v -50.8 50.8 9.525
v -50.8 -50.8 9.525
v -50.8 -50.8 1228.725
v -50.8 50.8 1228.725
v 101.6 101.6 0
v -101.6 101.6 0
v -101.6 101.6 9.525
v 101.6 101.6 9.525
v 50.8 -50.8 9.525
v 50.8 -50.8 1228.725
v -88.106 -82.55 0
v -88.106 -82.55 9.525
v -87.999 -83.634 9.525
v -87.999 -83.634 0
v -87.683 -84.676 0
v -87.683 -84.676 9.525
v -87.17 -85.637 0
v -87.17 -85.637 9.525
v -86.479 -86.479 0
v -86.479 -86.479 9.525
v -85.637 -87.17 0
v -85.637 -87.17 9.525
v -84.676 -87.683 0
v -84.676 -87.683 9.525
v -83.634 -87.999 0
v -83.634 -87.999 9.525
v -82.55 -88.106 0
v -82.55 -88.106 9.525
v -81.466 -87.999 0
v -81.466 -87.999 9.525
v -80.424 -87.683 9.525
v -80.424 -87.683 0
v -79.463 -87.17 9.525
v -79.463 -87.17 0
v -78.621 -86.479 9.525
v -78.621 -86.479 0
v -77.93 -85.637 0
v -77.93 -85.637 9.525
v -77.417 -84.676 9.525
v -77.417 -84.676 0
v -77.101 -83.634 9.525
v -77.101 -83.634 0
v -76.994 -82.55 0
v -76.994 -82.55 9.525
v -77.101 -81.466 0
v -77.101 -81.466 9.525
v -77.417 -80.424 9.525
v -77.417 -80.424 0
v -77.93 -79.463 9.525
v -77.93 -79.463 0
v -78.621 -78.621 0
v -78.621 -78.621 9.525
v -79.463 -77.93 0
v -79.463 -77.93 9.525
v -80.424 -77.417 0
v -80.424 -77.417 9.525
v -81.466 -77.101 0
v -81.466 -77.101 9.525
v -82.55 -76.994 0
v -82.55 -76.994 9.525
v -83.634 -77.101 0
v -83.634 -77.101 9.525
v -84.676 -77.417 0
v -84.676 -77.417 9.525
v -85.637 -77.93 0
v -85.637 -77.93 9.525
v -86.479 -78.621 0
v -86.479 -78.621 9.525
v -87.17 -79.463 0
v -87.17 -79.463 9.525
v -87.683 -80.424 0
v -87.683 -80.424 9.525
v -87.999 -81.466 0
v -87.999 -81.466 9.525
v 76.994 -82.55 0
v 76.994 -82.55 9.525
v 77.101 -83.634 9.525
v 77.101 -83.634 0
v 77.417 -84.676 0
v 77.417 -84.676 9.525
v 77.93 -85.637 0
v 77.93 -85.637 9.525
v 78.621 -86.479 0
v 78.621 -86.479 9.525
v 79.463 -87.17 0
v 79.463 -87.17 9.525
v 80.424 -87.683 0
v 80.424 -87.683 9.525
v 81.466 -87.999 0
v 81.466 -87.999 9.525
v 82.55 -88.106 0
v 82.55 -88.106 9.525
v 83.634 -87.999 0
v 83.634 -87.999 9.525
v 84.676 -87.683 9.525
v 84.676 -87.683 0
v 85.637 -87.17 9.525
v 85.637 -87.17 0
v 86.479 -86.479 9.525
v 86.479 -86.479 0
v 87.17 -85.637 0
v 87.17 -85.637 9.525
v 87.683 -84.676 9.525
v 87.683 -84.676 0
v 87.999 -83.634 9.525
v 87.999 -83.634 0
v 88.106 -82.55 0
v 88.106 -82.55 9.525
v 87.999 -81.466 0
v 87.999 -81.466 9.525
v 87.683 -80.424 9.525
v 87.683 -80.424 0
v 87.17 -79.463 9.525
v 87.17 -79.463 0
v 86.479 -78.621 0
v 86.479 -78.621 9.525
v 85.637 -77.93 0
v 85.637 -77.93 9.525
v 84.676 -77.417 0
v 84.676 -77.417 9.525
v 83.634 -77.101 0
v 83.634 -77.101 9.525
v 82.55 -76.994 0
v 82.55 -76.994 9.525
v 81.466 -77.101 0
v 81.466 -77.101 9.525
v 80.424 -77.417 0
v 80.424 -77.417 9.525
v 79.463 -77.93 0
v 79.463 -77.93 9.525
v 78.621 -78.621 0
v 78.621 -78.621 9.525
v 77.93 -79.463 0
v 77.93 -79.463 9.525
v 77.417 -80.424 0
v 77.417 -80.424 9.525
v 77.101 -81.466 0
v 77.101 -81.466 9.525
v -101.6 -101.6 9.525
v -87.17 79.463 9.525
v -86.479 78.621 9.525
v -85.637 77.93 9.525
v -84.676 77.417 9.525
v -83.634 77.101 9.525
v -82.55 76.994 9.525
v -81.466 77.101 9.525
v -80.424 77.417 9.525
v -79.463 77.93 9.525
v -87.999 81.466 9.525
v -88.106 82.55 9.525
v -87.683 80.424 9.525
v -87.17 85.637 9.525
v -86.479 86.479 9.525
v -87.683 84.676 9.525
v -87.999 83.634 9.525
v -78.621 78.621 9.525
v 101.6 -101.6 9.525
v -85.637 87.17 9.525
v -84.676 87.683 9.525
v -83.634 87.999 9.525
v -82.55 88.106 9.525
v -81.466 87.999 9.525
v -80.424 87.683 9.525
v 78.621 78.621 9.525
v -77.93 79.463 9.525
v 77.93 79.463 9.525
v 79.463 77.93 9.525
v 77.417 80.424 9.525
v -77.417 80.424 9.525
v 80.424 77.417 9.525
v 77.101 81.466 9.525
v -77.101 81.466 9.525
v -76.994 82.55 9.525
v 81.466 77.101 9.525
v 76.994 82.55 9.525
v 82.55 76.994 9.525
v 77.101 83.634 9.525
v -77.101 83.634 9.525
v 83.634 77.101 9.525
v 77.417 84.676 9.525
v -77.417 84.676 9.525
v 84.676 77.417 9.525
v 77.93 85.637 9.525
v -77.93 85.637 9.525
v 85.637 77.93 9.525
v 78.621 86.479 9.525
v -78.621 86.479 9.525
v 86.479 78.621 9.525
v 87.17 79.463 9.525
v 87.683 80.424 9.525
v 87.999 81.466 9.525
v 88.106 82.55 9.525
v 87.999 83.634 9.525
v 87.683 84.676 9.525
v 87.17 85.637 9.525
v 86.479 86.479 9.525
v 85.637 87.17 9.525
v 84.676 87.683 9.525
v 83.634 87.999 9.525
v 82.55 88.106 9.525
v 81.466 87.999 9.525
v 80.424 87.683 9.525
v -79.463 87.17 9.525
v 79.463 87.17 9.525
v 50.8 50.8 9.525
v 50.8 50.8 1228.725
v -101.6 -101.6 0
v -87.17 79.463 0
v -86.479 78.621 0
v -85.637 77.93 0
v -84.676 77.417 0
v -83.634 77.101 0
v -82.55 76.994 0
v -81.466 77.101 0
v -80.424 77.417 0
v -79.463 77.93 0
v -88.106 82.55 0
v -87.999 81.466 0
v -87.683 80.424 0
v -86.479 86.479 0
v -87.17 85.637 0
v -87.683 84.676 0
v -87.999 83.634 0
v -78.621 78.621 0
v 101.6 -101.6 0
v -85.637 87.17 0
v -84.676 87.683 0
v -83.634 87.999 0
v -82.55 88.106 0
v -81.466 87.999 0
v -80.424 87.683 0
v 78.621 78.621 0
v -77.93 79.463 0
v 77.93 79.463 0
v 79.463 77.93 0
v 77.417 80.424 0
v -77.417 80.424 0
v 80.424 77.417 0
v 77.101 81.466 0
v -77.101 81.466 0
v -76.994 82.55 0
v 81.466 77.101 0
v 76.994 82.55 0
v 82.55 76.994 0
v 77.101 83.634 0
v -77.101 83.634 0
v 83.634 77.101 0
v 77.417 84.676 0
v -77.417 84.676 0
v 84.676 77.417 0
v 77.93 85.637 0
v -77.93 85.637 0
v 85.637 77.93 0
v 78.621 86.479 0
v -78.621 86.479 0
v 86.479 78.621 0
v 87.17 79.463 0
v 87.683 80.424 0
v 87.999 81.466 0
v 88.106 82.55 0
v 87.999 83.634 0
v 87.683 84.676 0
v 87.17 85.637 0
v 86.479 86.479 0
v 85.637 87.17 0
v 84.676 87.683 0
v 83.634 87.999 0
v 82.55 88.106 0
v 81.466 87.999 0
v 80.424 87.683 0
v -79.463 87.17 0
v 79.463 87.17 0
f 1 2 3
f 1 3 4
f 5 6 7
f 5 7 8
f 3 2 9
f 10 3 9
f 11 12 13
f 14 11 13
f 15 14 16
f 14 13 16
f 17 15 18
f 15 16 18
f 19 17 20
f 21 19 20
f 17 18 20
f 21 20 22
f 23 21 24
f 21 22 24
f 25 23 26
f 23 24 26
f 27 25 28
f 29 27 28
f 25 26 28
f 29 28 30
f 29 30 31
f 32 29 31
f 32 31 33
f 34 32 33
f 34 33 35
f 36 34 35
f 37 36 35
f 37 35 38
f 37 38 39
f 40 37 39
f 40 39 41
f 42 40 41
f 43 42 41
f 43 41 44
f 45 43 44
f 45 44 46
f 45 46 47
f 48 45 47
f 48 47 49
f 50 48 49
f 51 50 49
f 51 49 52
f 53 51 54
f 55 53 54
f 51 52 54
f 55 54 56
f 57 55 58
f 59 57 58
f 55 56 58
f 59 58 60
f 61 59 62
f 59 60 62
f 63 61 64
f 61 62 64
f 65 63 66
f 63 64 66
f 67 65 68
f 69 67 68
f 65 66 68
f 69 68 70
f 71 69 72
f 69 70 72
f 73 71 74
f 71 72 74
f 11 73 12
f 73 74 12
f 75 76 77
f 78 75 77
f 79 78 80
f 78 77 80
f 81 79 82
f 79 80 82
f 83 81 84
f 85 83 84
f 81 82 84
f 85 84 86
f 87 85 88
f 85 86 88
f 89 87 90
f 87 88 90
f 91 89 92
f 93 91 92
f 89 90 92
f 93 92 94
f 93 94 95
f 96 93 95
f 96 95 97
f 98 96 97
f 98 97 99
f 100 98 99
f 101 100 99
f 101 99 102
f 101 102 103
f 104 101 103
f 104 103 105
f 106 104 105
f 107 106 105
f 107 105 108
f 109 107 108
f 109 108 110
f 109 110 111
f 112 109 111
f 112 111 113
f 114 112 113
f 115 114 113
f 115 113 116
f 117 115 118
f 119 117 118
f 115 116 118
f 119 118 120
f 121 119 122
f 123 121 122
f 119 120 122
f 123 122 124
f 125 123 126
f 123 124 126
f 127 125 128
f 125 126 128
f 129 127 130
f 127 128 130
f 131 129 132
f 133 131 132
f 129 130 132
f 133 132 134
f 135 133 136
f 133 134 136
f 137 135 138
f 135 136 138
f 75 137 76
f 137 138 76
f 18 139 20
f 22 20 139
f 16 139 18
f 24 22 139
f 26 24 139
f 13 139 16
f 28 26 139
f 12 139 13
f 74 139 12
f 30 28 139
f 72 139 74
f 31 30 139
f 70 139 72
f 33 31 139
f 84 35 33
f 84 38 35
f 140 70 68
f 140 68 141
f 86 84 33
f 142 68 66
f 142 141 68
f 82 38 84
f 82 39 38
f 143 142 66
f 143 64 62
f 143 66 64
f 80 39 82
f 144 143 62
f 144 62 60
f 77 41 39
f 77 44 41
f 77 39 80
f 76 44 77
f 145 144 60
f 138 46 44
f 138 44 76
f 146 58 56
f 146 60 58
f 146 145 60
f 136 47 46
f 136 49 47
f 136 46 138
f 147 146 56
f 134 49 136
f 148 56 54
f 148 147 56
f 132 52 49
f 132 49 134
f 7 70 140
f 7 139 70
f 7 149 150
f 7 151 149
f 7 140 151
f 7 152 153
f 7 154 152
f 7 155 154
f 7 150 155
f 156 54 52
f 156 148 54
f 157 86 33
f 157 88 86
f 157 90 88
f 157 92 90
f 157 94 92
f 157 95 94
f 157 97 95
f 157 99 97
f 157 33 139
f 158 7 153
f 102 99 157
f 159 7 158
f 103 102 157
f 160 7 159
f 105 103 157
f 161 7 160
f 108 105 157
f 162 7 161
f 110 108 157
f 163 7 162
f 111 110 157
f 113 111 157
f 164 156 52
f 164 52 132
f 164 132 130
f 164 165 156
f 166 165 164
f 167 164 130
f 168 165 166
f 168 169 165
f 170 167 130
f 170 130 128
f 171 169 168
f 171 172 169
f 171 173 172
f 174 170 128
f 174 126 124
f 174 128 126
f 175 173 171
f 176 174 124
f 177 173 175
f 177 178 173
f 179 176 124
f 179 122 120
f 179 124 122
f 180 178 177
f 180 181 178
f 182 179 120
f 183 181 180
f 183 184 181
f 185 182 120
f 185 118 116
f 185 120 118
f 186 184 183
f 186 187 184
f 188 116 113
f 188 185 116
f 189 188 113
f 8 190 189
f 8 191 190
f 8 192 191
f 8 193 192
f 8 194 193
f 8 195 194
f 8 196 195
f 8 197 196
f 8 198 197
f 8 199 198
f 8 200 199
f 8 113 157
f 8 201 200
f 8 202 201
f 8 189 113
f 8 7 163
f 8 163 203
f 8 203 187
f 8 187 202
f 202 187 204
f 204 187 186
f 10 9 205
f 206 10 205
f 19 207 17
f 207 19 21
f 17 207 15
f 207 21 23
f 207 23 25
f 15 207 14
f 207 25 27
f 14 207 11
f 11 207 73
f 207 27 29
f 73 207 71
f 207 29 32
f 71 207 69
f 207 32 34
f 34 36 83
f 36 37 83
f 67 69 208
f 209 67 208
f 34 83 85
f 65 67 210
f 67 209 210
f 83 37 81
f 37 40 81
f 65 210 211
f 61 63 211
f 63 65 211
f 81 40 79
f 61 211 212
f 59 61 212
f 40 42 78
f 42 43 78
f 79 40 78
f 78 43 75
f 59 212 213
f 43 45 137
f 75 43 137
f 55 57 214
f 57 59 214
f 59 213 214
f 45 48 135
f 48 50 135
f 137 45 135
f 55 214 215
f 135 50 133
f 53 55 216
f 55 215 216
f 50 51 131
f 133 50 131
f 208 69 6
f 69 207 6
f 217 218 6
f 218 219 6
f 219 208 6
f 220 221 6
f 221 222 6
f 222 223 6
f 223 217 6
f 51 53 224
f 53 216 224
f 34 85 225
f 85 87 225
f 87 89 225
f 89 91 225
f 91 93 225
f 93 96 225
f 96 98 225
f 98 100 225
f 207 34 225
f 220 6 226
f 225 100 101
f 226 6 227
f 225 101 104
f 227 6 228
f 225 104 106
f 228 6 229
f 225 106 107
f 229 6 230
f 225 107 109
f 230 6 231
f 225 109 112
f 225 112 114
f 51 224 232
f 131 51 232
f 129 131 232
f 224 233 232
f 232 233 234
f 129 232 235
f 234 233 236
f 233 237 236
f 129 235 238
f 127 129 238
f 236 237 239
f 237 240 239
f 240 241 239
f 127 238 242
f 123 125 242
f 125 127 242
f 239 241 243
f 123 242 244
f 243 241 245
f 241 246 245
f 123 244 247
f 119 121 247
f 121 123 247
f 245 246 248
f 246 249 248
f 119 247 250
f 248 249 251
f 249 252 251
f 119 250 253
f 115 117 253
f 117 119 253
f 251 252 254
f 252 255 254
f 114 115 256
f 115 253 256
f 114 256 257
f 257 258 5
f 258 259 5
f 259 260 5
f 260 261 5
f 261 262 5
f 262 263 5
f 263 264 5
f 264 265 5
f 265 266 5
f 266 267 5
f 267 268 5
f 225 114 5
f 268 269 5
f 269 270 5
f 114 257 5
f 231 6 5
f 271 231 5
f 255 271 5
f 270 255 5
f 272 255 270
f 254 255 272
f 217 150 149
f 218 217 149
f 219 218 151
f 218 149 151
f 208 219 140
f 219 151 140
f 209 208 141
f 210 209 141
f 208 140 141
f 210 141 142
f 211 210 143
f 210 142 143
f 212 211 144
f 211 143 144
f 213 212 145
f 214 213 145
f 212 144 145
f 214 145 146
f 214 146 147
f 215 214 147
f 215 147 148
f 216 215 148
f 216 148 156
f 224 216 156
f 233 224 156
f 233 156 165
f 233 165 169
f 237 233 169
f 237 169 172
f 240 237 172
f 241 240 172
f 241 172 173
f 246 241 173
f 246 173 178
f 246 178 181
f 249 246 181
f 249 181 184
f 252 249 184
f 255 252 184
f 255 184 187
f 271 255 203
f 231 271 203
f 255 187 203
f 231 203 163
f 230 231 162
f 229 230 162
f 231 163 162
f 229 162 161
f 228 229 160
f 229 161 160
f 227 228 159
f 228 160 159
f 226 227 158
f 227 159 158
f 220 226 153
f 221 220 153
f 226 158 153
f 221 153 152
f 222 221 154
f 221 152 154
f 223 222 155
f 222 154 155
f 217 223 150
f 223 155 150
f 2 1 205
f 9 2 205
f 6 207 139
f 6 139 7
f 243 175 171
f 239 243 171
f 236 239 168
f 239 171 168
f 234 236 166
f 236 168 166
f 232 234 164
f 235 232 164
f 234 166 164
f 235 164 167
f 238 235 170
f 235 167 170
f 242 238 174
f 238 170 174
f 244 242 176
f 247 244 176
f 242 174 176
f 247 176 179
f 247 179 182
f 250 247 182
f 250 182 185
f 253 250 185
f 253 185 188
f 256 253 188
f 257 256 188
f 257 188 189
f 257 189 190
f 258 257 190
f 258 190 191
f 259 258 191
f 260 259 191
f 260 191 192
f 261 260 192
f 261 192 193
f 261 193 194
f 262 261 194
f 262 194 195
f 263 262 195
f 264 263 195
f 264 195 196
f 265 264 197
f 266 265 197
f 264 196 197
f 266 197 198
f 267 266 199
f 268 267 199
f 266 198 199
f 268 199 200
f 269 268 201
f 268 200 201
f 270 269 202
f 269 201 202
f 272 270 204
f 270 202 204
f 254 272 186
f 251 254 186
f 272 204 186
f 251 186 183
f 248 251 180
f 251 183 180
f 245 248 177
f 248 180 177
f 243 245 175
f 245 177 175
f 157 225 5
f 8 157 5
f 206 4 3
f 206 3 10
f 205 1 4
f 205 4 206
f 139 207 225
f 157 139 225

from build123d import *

# Parameters (mm, degrees)
F0_W     = 203.2
F0_H     = 203.2
F1_DEPTH = 9.525
F3_D     = 11.1125
F2_W     = 101.6
F2_H     = 101.6
F4_DEPTH = 1219.2


with BuildPart() as f1:
    # F0 (on Top) → F1 (new body)
    with BuildSketch(Plane.XY):
        Rectangle(F0_W, F0_H)
    extrude(amount=F1_DEPTH)

    # F3 (through all)
    with Locations(Plane(origin=(0, 0, 0), x_dir=(1, 0, 0), z_dir=(0, 0, -1))):
        with Locations((-82.55, 82.55), (82.55, 82.55), (82.55, -82.55), (-82.55, -82.55)):
            Hole(F3_D / 2)


with BuildPart() as f4:
    # F2 (on face) → F4 (new body)
    with BuildSketch(Plane.XY.offset(9.525)):
        Rectangle(F2_W, F2_H)
    extrude(amount=F4_DEPTH)


solid = Compound([f1.part, f4.part])
